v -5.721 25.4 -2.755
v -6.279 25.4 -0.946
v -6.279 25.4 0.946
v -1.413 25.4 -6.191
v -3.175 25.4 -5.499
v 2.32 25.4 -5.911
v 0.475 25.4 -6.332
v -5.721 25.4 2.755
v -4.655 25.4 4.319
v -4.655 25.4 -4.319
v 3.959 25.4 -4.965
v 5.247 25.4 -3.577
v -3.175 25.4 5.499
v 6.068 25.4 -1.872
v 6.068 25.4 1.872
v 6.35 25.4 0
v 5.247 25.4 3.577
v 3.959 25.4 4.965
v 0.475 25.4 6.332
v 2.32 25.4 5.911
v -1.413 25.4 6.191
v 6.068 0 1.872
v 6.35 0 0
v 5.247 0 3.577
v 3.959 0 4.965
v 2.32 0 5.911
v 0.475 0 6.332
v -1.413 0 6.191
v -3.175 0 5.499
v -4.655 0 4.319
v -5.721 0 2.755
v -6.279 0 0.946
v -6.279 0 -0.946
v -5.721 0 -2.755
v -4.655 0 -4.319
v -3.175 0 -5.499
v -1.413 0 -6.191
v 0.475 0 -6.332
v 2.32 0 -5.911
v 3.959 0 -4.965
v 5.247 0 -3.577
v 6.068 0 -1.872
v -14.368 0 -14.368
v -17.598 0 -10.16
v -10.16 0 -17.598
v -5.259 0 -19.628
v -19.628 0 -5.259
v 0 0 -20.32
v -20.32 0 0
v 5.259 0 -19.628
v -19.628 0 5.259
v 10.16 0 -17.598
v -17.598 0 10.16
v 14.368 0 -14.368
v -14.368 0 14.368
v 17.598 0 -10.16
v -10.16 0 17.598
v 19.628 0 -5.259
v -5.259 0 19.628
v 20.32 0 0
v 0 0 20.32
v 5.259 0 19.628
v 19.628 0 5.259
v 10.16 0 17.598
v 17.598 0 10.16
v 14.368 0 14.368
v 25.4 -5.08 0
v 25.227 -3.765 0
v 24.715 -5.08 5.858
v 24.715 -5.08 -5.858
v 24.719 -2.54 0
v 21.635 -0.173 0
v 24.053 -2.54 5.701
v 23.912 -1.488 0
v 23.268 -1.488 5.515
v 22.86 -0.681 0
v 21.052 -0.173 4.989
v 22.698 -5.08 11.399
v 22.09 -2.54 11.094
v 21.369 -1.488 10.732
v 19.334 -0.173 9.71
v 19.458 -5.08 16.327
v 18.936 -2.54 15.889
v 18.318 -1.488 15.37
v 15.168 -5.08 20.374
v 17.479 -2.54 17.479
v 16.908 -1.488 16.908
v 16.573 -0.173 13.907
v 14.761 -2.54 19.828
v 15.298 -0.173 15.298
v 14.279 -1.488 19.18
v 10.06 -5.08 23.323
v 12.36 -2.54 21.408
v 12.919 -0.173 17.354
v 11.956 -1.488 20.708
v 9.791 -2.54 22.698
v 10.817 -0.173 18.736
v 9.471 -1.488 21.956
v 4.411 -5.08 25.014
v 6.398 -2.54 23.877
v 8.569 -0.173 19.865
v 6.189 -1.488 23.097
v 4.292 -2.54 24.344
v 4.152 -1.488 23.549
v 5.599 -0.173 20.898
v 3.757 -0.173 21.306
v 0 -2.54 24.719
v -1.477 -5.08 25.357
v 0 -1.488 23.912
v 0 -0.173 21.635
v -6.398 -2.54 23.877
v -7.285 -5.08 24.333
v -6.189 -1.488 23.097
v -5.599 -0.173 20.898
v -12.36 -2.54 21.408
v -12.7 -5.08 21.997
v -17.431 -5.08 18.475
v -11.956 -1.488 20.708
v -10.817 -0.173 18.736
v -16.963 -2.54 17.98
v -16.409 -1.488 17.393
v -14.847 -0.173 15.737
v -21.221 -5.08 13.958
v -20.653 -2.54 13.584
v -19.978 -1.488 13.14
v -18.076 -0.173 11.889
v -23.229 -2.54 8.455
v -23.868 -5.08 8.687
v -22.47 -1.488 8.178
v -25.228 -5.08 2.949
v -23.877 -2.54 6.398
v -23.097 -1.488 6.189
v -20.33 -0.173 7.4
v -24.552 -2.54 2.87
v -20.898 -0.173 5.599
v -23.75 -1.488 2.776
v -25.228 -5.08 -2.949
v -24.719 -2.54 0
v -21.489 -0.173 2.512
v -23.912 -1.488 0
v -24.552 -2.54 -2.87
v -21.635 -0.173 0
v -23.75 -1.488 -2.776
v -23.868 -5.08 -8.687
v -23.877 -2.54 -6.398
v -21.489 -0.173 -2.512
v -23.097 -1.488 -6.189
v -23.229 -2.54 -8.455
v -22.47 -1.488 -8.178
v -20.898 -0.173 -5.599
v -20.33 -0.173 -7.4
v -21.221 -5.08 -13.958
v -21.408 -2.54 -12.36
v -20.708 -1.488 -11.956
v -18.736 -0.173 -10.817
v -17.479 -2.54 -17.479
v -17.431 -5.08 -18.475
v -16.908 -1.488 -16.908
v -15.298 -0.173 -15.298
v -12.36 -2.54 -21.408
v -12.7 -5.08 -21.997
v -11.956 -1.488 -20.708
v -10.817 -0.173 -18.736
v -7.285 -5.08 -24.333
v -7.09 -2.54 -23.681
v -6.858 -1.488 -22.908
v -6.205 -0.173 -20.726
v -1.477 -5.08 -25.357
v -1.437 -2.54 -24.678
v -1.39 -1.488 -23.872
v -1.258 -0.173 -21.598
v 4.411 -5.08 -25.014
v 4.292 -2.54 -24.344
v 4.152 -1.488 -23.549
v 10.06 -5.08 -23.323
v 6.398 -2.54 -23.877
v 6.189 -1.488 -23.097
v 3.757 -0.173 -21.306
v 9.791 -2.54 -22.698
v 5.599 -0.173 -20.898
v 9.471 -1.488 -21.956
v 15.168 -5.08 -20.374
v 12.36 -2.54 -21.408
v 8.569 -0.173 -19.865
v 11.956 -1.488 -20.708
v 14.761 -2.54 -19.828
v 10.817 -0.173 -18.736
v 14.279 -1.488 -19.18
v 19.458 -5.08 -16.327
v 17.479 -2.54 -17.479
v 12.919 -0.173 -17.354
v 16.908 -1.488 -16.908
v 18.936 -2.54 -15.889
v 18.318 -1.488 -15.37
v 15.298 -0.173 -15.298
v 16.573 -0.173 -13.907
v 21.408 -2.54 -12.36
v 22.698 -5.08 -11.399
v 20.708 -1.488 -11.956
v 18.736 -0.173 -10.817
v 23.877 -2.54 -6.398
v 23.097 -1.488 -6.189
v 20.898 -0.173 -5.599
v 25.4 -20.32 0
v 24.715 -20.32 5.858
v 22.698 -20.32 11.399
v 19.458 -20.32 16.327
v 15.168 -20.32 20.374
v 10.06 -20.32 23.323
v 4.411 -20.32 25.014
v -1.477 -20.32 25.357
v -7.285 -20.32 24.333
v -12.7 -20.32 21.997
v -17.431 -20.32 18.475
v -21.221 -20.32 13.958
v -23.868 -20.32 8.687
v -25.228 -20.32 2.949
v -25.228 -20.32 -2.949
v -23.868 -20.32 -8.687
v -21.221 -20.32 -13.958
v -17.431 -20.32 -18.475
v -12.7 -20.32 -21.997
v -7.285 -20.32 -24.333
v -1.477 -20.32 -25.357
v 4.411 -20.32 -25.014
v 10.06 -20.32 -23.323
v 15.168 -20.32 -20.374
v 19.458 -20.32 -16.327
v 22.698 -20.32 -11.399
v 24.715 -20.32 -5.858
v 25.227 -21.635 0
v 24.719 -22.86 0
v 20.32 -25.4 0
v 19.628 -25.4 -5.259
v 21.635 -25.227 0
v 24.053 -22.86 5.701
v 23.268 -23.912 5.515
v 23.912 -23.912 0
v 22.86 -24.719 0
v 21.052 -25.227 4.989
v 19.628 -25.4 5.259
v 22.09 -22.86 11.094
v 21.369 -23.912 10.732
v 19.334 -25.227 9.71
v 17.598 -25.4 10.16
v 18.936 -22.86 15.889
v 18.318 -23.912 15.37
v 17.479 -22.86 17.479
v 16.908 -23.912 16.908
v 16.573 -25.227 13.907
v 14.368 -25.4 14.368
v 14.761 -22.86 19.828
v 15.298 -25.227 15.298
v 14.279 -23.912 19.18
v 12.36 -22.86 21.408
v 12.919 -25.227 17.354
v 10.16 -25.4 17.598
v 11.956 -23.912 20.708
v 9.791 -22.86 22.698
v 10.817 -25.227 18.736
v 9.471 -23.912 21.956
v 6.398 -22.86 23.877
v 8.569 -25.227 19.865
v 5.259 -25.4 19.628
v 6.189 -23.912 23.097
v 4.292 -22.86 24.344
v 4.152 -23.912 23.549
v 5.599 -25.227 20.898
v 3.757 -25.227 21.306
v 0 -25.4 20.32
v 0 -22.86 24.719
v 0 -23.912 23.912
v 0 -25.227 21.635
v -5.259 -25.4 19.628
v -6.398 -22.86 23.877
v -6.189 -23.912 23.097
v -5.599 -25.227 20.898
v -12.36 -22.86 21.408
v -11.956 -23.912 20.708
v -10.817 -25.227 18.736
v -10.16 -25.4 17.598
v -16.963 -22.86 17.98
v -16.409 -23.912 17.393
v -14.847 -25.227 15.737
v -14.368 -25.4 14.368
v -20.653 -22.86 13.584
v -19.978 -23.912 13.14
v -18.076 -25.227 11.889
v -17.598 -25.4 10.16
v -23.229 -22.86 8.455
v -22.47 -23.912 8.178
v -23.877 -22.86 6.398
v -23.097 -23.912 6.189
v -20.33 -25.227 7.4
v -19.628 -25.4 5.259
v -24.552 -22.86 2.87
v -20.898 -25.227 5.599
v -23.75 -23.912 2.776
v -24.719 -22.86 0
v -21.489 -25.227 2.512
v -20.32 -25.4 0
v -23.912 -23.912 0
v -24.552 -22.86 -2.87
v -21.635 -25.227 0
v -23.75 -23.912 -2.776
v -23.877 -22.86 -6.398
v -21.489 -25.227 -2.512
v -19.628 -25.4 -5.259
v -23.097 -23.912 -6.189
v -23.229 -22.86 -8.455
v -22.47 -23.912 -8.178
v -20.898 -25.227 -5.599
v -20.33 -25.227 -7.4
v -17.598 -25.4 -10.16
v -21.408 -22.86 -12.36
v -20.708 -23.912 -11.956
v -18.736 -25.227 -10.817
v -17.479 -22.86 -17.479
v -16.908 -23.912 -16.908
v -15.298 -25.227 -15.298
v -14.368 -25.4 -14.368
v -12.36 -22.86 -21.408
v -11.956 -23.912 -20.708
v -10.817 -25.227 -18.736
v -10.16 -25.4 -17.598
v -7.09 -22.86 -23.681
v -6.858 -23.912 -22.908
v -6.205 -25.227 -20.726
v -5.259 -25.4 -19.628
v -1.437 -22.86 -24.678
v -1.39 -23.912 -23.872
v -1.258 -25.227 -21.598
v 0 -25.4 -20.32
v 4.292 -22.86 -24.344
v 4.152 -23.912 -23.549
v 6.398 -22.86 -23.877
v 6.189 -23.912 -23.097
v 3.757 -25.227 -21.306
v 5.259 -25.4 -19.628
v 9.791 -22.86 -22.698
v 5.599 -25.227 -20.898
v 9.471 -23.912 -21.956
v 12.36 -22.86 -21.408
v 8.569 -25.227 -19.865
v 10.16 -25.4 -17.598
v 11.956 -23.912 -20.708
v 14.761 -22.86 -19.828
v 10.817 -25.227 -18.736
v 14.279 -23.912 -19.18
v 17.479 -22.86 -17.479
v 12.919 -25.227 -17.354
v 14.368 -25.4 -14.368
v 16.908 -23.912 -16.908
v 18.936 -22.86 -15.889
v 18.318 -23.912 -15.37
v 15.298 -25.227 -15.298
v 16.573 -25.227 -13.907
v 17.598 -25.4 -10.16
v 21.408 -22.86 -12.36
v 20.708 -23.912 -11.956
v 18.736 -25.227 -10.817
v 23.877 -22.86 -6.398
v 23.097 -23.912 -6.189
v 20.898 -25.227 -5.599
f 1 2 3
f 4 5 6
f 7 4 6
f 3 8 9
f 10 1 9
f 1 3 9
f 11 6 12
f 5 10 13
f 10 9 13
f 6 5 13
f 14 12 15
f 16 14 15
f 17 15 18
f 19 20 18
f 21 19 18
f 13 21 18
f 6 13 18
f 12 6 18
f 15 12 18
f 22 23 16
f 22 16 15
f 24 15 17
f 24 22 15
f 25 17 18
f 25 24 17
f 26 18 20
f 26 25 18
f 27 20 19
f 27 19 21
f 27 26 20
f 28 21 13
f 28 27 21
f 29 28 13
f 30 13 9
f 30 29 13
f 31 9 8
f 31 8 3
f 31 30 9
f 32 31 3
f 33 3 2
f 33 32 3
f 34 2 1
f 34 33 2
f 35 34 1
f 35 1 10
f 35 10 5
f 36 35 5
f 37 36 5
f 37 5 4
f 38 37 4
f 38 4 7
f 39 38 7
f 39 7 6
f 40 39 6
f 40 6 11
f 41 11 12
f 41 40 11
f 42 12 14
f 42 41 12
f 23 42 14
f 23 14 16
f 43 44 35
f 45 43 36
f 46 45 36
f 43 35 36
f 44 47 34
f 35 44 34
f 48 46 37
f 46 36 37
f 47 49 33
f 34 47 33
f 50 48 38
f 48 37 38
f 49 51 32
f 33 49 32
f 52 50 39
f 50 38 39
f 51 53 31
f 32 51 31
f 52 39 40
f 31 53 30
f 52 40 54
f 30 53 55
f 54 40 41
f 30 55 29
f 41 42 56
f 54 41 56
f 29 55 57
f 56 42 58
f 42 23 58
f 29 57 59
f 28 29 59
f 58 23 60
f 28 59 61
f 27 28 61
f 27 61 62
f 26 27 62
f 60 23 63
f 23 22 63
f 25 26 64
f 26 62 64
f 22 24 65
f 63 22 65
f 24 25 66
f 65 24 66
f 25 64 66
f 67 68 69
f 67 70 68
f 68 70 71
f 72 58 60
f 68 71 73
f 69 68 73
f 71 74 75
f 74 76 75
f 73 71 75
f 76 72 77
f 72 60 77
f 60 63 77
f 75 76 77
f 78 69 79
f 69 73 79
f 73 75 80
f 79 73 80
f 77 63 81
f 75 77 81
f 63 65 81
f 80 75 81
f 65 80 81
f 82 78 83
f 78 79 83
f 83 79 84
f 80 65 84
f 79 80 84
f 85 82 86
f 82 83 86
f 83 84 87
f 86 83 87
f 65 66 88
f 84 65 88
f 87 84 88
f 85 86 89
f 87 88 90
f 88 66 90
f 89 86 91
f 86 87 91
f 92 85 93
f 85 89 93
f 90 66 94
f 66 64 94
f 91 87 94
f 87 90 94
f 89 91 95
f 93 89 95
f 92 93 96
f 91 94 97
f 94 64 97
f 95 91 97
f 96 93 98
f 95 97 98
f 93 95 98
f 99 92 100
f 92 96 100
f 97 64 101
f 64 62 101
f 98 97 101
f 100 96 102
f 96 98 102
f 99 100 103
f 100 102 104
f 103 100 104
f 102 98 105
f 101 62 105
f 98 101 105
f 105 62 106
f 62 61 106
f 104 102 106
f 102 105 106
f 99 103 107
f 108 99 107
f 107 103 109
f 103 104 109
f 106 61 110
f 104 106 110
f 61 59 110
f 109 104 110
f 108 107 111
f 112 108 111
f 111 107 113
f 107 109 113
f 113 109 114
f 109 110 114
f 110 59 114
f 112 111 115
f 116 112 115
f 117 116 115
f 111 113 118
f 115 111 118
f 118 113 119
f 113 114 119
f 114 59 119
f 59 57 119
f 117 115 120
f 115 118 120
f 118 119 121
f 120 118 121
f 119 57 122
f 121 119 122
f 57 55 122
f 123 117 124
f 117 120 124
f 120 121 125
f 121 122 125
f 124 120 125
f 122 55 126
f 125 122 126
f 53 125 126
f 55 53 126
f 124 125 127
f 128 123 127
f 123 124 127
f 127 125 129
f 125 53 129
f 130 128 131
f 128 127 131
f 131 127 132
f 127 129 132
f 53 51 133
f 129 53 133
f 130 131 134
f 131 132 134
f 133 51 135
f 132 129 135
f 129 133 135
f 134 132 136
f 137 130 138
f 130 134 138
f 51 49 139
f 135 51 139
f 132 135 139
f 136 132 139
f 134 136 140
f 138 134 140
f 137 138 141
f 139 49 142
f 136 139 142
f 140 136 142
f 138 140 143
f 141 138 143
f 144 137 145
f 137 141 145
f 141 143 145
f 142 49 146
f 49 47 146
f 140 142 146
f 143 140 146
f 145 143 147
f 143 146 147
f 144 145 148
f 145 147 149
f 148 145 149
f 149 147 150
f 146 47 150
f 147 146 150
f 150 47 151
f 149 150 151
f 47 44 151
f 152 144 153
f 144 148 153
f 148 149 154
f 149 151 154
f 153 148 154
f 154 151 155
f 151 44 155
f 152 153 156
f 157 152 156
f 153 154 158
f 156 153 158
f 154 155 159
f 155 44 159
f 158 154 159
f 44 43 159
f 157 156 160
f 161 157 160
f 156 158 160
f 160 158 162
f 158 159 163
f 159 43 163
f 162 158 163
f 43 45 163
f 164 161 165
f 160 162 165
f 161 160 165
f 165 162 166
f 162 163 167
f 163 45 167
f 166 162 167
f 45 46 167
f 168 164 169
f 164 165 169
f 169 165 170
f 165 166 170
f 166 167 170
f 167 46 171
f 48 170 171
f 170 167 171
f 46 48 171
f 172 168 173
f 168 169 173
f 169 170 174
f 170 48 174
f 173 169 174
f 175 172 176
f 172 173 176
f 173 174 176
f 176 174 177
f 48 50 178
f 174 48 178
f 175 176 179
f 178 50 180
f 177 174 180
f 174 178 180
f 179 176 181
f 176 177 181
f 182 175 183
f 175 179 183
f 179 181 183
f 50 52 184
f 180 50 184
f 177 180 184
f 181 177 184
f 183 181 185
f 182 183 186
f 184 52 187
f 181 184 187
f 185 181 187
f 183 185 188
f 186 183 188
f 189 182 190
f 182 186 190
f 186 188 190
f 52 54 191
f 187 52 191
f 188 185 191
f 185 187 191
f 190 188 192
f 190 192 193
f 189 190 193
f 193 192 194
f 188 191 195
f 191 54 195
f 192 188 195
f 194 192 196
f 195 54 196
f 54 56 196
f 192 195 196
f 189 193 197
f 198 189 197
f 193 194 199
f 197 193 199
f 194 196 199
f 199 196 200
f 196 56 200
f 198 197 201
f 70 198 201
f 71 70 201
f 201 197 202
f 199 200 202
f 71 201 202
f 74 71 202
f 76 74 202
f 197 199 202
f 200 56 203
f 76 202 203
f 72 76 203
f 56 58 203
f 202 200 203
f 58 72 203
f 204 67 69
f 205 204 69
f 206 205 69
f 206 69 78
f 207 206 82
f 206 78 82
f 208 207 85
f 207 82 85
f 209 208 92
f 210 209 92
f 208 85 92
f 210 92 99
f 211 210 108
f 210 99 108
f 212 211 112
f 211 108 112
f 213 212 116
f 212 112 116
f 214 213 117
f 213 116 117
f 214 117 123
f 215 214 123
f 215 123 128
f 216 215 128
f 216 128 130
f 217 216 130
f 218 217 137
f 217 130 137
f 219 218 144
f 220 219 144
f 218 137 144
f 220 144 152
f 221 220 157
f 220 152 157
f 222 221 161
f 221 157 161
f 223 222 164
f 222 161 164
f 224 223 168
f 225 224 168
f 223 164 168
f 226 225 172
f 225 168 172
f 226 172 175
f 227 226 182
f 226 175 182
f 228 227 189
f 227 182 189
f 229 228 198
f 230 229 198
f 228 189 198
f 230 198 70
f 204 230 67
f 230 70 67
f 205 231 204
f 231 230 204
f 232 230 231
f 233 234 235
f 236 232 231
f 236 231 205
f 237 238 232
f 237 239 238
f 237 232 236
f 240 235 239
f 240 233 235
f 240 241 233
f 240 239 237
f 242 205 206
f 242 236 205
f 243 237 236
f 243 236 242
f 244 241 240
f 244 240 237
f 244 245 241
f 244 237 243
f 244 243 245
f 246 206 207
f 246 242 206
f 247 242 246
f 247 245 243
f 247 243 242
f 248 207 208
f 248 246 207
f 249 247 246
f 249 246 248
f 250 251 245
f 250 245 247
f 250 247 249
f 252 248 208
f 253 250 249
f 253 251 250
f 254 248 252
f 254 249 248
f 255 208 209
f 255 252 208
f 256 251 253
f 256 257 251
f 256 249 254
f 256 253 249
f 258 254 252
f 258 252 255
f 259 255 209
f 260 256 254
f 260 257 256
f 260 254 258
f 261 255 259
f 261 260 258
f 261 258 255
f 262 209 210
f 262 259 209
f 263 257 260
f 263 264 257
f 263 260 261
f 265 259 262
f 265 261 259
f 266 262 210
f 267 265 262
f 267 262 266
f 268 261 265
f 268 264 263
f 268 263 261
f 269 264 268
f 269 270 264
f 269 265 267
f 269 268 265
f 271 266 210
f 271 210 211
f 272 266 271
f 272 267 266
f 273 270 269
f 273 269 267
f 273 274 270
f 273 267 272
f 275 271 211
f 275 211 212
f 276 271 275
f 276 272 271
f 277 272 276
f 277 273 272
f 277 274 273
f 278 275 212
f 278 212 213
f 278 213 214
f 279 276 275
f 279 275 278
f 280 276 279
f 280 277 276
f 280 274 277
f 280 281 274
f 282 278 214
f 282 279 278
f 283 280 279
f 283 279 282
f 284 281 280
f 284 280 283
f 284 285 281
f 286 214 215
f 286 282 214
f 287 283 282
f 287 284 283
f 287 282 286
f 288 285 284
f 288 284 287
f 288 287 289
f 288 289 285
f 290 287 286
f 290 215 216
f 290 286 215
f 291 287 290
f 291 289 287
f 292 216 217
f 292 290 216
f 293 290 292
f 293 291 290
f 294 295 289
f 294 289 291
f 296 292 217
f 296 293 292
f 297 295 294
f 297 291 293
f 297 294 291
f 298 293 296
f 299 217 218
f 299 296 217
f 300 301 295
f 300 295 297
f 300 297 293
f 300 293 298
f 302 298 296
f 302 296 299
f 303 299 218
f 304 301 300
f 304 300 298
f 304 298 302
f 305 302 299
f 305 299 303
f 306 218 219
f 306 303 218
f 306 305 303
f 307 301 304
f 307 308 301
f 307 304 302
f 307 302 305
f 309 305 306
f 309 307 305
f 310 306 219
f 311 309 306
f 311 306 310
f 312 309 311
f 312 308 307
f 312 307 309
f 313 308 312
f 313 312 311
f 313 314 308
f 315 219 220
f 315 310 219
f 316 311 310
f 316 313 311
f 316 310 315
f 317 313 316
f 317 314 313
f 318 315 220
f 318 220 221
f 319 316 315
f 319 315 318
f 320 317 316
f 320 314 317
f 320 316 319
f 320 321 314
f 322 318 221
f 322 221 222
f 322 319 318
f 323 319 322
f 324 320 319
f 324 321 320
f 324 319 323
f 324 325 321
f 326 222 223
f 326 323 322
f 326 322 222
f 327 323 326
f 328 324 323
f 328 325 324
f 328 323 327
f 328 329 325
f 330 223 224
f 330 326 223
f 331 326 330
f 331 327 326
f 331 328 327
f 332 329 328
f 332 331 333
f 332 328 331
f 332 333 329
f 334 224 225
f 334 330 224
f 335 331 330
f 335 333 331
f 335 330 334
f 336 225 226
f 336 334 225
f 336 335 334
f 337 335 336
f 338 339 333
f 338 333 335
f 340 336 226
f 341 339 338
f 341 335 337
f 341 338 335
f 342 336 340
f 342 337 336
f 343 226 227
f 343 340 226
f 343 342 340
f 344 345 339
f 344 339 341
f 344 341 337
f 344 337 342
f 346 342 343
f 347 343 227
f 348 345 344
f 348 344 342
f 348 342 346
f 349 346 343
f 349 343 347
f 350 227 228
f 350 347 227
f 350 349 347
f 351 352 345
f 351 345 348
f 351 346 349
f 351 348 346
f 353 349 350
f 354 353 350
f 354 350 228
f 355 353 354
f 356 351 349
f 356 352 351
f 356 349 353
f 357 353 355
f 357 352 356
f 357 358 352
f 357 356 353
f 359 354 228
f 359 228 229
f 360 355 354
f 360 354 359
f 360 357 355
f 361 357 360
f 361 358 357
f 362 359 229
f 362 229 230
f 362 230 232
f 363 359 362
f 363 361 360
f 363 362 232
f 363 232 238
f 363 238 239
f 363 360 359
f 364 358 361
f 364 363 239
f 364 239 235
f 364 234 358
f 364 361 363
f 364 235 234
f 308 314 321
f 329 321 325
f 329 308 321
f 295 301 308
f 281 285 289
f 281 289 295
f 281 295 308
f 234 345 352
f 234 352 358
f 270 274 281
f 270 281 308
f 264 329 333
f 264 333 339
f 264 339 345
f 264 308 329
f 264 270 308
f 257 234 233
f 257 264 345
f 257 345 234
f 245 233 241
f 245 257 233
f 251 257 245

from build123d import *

# Parameters (mm, degrees)
F0_R     = 25.4
F0_R_2   = 6.35
F1_DEPTH = 25.4
F2_R     = 5.08
F3_DEPTH = 25.4


with BuildPart() as f1:
    # F0 (on Front) → F1 (new body)
    with BuildSketch(Plane.XZ):
        Circle(F0_R)
        Circle(F0_R_2, mode=Mode.SUBTRACT)
        Circle(F0_R_2)
    extrude(amount=F1_DEPTH)

    # F2
    f2_edges = [f1.edges().sort_by_distance(p)[0] for p in [
        (-25.4, -25.4, 0),
        (-25.4, 0, 0),
    ]]
    fillet(f2_edges, radius=F2_R)

    # F0 (on Front) → F3 (join)
    with BuildSketch(Plane.XZ):
        Circle(F0_R_2)
    extrude(amount=-F3_DEPTH)


solid = f1.part
